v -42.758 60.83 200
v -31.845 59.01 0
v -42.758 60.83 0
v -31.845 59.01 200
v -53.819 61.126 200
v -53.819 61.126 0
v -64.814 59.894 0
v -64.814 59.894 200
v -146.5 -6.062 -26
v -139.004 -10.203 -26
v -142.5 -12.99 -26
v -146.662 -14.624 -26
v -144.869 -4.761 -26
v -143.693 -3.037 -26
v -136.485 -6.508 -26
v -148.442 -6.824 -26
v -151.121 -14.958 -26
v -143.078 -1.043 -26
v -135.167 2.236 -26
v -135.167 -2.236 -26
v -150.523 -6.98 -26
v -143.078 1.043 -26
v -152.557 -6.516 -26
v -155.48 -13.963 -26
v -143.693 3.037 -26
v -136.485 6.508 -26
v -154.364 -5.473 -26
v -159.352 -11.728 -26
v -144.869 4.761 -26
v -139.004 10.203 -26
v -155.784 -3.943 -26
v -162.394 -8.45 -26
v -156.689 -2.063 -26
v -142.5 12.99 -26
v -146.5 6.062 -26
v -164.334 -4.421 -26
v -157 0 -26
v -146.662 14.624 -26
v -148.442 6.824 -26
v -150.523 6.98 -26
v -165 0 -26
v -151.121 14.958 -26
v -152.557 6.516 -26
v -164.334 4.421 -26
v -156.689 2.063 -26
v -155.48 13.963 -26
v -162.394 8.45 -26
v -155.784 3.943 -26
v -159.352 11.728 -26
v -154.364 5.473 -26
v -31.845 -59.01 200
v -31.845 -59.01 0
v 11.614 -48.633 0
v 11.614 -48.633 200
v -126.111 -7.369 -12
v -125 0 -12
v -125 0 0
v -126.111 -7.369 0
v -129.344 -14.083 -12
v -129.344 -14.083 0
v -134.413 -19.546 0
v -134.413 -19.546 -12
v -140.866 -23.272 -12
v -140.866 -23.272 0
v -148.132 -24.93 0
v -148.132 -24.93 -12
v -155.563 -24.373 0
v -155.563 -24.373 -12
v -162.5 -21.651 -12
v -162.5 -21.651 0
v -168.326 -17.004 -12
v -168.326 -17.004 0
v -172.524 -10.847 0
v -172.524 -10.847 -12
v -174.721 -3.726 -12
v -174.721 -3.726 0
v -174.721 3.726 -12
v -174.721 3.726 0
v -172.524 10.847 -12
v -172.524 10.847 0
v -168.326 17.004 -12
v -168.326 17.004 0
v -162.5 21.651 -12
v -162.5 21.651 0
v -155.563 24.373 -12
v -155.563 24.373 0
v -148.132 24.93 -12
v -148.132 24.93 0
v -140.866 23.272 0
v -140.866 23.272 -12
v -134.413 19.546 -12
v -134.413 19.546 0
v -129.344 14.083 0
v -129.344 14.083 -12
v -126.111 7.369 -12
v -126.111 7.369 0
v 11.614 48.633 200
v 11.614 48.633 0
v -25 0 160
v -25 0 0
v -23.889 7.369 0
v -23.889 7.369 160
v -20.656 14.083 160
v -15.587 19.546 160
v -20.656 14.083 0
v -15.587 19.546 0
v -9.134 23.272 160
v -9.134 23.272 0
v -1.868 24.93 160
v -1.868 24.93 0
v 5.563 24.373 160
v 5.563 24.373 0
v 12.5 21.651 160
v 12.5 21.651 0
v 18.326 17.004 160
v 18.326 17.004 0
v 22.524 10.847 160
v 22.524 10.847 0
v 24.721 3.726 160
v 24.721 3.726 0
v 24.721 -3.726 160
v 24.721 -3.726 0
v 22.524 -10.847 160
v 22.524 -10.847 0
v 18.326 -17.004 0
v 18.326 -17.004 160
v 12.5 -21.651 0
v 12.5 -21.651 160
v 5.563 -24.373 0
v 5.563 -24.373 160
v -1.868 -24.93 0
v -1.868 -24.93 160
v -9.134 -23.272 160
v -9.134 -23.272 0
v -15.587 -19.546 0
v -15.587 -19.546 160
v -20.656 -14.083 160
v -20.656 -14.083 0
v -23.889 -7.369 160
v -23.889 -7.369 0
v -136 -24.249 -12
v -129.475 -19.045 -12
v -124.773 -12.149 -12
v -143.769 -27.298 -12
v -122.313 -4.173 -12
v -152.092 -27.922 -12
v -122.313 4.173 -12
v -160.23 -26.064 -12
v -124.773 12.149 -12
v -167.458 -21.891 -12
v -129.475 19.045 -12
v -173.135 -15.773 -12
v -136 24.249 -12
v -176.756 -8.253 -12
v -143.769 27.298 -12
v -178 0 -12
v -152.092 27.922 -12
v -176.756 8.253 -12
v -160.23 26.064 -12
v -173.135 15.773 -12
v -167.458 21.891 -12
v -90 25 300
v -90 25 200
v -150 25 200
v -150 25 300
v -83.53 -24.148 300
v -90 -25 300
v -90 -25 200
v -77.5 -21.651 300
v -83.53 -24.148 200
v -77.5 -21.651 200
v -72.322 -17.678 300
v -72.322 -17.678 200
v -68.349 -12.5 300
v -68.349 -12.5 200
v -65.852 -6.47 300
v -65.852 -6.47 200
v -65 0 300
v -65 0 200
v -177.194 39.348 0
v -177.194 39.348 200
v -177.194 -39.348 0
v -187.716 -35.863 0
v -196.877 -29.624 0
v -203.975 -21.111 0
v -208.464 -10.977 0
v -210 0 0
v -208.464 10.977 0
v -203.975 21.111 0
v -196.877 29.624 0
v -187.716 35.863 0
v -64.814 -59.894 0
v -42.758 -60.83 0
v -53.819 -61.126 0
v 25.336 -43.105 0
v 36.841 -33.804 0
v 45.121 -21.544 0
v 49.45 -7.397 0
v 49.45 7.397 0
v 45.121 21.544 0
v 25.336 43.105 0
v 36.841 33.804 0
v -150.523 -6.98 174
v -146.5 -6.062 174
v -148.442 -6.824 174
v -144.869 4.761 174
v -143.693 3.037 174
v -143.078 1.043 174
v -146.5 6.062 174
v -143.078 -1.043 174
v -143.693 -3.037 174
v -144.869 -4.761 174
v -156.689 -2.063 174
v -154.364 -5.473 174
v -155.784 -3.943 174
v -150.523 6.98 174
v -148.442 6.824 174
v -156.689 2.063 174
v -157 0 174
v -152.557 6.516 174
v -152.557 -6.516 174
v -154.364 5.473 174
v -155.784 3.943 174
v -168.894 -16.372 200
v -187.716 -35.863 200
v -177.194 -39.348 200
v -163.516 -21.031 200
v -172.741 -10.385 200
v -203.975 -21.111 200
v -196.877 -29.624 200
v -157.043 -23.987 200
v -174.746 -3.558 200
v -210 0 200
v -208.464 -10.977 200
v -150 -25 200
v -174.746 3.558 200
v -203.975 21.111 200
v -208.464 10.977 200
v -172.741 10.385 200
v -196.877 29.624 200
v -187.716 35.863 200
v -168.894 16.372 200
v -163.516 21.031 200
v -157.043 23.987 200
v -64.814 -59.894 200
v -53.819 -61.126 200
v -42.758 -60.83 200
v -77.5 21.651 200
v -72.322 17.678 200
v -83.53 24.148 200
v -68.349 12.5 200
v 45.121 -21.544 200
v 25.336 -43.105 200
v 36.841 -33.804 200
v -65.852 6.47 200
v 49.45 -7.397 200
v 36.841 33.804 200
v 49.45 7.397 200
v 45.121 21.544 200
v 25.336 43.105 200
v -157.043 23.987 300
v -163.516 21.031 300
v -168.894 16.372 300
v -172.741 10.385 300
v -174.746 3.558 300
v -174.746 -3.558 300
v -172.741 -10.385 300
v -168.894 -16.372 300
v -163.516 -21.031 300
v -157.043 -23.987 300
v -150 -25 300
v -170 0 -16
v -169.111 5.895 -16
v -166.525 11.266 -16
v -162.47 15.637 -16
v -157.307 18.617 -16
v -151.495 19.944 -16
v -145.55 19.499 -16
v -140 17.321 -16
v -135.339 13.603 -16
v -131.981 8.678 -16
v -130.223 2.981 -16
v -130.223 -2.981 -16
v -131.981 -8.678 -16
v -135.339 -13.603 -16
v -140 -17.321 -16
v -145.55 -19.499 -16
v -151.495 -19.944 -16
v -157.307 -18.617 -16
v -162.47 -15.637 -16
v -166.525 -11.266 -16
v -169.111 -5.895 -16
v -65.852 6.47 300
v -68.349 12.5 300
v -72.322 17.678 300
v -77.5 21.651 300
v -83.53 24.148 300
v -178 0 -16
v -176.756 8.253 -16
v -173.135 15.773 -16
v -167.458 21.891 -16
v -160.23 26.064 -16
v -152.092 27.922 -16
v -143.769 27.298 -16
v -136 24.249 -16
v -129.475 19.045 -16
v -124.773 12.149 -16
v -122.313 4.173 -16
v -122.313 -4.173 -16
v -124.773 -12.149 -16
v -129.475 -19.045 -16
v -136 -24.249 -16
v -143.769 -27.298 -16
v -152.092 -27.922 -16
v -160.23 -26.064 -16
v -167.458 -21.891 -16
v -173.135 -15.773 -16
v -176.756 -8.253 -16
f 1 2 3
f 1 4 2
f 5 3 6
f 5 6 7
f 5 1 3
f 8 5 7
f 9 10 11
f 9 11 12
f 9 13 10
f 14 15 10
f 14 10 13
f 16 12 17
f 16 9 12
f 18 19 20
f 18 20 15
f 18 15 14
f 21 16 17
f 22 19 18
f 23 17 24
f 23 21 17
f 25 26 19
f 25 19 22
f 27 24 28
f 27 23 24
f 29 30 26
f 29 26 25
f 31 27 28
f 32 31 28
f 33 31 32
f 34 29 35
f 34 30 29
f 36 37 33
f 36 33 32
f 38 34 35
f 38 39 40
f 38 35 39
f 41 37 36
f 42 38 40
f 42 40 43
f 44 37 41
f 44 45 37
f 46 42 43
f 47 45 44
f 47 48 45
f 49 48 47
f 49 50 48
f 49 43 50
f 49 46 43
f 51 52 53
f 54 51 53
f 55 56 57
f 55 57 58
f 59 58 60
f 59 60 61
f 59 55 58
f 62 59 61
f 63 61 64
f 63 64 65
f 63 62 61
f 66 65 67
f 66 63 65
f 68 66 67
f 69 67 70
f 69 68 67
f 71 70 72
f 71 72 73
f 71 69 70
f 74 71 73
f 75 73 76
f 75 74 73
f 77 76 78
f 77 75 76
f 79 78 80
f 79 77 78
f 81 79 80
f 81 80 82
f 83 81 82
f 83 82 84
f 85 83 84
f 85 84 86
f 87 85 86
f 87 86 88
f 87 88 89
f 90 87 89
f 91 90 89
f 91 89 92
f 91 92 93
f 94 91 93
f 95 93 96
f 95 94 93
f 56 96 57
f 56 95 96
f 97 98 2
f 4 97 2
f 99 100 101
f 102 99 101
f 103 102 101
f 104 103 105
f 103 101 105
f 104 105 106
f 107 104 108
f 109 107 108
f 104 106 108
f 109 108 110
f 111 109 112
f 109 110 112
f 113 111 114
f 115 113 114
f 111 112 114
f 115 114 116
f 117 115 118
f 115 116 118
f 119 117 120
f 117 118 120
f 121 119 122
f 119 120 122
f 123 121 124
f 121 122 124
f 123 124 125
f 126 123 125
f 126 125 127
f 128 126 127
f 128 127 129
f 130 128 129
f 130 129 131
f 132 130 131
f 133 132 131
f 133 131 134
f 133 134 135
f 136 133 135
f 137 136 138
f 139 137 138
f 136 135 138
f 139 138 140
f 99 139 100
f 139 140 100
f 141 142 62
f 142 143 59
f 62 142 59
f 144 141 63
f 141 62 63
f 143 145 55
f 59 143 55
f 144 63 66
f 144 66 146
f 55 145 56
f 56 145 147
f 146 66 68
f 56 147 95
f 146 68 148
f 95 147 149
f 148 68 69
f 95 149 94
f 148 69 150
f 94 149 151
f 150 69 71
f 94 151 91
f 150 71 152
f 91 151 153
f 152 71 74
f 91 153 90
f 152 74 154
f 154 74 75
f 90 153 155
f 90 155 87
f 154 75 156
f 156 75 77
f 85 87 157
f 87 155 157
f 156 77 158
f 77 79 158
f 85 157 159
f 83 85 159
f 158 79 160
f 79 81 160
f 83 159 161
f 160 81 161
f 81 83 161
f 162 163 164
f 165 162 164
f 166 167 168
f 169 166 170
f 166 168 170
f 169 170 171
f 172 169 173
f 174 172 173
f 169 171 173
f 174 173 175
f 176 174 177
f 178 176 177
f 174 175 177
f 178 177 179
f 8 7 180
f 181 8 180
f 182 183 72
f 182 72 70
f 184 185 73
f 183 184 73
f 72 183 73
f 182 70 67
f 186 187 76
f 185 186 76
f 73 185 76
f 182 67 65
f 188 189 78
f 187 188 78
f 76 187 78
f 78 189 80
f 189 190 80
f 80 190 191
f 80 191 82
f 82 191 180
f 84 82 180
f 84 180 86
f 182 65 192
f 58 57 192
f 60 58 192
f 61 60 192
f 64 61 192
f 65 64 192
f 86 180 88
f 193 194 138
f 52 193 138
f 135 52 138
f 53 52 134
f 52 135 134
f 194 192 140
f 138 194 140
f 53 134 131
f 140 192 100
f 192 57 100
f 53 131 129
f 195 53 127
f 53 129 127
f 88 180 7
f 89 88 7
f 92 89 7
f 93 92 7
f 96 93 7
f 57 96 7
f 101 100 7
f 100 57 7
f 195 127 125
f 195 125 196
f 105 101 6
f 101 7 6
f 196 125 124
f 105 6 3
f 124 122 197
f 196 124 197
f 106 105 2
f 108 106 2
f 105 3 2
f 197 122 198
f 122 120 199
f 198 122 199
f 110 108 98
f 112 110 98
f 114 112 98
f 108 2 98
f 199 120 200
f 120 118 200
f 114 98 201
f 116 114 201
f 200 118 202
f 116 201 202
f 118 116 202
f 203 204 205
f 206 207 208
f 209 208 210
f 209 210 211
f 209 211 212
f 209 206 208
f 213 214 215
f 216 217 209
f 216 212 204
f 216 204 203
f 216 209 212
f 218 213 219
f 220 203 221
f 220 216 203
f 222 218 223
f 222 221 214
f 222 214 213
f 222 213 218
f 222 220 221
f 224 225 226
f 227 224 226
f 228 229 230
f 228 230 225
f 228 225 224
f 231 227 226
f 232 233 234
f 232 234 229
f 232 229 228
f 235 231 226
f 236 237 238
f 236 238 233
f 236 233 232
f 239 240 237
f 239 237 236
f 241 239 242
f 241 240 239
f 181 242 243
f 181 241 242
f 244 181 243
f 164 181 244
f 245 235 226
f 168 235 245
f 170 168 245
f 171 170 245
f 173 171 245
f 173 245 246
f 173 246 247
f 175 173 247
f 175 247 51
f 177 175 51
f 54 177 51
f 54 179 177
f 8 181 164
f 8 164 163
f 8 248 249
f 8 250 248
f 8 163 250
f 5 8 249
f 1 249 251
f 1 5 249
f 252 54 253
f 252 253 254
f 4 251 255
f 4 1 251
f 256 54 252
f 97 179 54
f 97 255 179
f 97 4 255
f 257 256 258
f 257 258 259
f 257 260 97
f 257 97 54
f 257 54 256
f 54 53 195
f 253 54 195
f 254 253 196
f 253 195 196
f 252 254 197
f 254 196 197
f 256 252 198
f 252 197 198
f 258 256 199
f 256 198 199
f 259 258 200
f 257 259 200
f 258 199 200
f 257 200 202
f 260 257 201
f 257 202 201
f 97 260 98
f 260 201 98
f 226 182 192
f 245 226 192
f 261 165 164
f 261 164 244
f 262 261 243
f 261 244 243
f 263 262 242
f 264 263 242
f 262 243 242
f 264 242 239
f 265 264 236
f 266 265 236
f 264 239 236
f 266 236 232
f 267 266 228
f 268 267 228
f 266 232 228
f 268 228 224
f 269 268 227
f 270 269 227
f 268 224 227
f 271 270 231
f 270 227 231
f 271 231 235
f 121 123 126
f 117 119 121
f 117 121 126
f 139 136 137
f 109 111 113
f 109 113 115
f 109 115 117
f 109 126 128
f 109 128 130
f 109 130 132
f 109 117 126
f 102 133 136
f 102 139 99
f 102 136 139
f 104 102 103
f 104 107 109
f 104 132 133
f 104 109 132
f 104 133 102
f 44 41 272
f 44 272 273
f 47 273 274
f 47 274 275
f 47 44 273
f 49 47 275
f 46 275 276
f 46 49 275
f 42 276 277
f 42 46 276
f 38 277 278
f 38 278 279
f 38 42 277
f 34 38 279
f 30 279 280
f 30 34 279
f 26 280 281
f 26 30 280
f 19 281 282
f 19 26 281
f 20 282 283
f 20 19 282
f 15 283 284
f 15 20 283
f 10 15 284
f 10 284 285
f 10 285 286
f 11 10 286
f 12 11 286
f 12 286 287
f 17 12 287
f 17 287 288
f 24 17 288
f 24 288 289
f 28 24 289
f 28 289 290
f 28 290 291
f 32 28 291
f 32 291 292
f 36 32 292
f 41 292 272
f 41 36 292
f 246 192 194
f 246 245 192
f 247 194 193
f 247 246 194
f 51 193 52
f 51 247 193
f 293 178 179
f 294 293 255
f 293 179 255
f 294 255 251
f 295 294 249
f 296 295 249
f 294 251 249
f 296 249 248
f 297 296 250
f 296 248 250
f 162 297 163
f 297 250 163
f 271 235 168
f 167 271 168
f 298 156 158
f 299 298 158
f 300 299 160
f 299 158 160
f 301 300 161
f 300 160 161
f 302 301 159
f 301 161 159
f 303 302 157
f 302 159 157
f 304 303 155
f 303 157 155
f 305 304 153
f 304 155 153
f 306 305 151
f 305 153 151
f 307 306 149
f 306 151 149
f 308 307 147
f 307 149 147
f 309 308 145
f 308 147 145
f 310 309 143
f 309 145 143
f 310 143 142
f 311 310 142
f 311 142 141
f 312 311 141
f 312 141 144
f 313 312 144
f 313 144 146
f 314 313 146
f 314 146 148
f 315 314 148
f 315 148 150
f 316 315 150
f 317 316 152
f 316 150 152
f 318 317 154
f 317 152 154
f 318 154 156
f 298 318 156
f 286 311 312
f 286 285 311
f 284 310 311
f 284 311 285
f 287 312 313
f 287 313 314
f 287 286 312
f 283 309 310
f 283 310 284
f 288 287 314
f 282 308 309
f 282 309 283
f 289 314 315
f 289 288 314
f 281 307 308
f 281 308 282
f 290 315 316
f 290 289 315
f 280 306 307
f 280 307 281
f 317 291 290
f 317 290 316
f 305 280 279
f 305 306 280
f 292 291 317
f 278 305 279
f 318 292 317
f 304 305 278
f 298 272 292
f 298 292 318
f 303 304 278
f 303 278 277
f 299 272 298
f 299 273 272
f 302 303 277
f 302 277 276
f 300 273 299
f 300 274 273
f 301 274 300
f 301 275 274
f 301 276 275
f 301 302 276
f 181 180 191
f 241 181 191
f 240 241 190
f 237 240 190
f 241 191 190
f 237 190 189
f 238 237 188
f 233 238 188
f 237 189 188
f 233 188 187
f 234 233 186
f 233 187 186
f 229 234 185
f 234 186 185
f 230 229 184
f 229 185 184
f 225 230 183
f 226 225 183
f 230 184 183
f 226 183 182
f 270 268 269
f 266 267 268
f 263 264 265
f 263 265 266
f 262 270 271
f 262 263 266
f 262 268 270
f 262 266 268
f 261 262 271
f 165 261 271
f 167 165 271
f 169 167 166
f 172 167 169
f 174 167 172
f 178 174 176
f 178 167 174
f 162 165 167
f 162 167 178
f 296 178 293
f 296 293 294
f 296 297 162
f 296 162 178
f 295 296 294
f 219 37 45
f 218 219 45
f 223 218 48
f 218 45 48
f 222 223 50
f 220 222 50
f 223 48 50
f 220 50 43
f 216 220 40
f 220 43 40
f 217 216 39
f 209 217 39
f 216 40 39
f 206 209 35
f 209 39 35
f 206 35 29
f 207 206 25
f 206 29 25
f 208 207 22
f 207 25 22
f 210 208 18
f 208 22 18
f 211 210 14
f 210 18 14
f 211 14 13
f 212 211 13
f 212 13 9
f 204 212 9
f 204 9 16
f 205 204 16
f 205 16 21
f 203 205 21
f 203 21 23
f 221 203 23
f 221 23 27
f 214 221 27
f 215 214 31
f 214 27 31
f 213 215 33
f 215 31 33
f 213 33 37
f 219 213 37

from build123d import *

# Parameters (mm, degrees)
EXTRUDE_1_DEPTH     = 200
FILLET_1_R          = 80
EXTRUDE_2_DEPTH     = 100
SKETCH_3_R          = 25
CUT_EXTRUDE_1_DEPTH = 160
EXTRUDE_START       = 12
SKETCH_4_R          = 25
EXTRUDE_3_DEPTH     = 12
SKETCH_5_R          = 28
EXTRUDE_4_DEPTH     = 4
SKETCH_6_R          = 20
EXTRUDE_5_DEPTH     = 10
CHAMFER_1_SIZE2     = 5
CHAMFER_1_SIZE      = 10
SKETCH_7_R          = 7
CUT_EXTRUDE_2_DEPTH = 200


with BuildPart() as part:
    # 草图1 → 凸台-拉伸1 (new body)
    with BuildSketch(Plane.XY):
        with BuildLine():
            ThreePointArc((11.613593767, -48.632545068), (50, 0), (11.613593767, 48.632545068))
            Line((11.613593767, 48.632545068), (-48.23619118, 62.924848473))
            Line((-48.23619118, 62.924848473), (-177.193873283, 39.347785035))
            ThreePointArc((-177.193873283, 39.347785035), (-210, 0), (-177.193873283, -39.347785035))
            Line((-177.193873283, -39.347785035), (-48.23619118, -62.924848473))
            Line((-48.23619118, -62.924848473), (11.613593767, -48.632545068))
        make_face()
    extrude(amount=EXTRUDE_1_DEPTH)

    # 圆角1
    fillet_1_edges = [part.edges().sort_by_distance(p)[0] for p in [
        (-48.23619118, -62.924848473, 100),
        (-48.23619118, 62.924848473, 100),
    ]]
    fillet(fillet_1_edges, radius=FILLET_1_R)

    # 草图2 → 凸台-拉伸2 (add)
    with BuildSketch(Plane.XY.offset(200)):
        with BuildLine():
            ThreePointArc((-125, 0), (-132.32233047, 17.67766953), (-150, 25))
            Line((-150, 25), (-150, -25))
            ThreePointArc((-150, -25), (-132.32233047, -17.67766953), (-125, 0))
        make_face()
        with BuildLine():
            Line((-150, -25), (-150, 25))
            ThreePointArc((-150, 25), (-175, 0), (-150, -25))
        make_face()
        with BuildLine():
            Line((-90, 25), (-150, 25))
            ThreePointArc((-150, 25), (-132.32233047, 17.67766953), (-125, 0))
            ThreePointArc((-125, 0), (-132.32233047, -17.67766953), (-150, -25))
            Line((-150, -25), (-90, -25))
            ThreePointArc((-90, -25), (-115, 0), (-90, 25))
        make_face()
        with BuildLine():
            ThreePointArc((-65, 0), (-72.32233047, 17.67766953), (-90, 25))
            Line((-90, 25), (-90, -25))
            ThreePointArc((-90, -25), (-72.32233047, -17.67766953), (-65, 0))
        make_face()
        with BuildLine():
            Line((-90, -25), (-90, 25))
            ThreePointArc((-90, 25), (-115, 0), (-90, -25))
        make_face()
    extrude(amount=EXTRUDE_2_DEPTH)

    # 草图3 → 切除-拉伸1 (cut)
    with BuildSketch(Plane(origin=(0, 0, 0), x_dir=(-1, 0, 0), z_dir=(0, 0, -1))):
        Circle(SKETCH_3_R)
    extrude(amount=-CUT_EXTRUDE_1_DEPTH, mode=Mode.SUBTRACT)

    # 草图4 → 凸台-拉伸3 (add)
    with BuildSketch(Plane(origin=(0, 0, 0), x_dir=(-1, 0, 0), z_dir=(0, 0, -1)).offset(EXTRUDE_START)):
        with Locations(Location((150, 0, 0), (0, 0, 180))):
            Circle(SKETCH_4_R)
    extrude(amount=-EXTRUDE_3_DEPTH)

    # 草图5 → 凸台-拉伸4 (add)
    with BuildSketch(Plane(origin=(0, 0, -12), x_dir=(-1, 0, 0), z_dir=(0, 0, -1))):
        with Locations((150, 0)):
            Circle(SKETCH_5_R)
    extrude(amount=EXTRUDE_4_DEPTH)

    # 草图6 → 凸台-拉伸5 (add)
    with BuildSketch(Plane(origin=(0, 0, -16), x_dir=(-1, 0, 0), z_dir=(0, 0, -1))):
        with Locations((150, 0)):
            Circle(SKETCH_6_R)
    extrude(amount=EXTRUDE_5_DEPTH)

    # 倒角1
    chamfer_1_edges = [part.edges().sort_by_distance(p)[0] for p in [
        (-130, 0, -26),
    ]]
    chamfer_1_side = [part.faces().sort_by_distance(p)[0] for p in [
        (-130, 0, -25.9),
    ]]
    chamfer(chamfer_1_edges, length=CHAMFER_1_SIZE - 0.0001, length2=CHAMFER_1_SIZE2 - 0.0001, reference=chamfer_1_side[0])  # a hair under: the kernel refuses the full size

    # 草图7 → 切除-拉伸2 (cut)
    with BuildSketch(Plane(origin=(0, 0, -26), x_dir=(-1, 0, 0), z_dir=(0, 0, -1))):
        with Locations((150, 0)):
            Circle(SKETCH_7_R)
    extrude(amount=-CUT_EXTRUDE_2_DEPTH, mode=Mode.SUBTRACT)


solid = part.part
